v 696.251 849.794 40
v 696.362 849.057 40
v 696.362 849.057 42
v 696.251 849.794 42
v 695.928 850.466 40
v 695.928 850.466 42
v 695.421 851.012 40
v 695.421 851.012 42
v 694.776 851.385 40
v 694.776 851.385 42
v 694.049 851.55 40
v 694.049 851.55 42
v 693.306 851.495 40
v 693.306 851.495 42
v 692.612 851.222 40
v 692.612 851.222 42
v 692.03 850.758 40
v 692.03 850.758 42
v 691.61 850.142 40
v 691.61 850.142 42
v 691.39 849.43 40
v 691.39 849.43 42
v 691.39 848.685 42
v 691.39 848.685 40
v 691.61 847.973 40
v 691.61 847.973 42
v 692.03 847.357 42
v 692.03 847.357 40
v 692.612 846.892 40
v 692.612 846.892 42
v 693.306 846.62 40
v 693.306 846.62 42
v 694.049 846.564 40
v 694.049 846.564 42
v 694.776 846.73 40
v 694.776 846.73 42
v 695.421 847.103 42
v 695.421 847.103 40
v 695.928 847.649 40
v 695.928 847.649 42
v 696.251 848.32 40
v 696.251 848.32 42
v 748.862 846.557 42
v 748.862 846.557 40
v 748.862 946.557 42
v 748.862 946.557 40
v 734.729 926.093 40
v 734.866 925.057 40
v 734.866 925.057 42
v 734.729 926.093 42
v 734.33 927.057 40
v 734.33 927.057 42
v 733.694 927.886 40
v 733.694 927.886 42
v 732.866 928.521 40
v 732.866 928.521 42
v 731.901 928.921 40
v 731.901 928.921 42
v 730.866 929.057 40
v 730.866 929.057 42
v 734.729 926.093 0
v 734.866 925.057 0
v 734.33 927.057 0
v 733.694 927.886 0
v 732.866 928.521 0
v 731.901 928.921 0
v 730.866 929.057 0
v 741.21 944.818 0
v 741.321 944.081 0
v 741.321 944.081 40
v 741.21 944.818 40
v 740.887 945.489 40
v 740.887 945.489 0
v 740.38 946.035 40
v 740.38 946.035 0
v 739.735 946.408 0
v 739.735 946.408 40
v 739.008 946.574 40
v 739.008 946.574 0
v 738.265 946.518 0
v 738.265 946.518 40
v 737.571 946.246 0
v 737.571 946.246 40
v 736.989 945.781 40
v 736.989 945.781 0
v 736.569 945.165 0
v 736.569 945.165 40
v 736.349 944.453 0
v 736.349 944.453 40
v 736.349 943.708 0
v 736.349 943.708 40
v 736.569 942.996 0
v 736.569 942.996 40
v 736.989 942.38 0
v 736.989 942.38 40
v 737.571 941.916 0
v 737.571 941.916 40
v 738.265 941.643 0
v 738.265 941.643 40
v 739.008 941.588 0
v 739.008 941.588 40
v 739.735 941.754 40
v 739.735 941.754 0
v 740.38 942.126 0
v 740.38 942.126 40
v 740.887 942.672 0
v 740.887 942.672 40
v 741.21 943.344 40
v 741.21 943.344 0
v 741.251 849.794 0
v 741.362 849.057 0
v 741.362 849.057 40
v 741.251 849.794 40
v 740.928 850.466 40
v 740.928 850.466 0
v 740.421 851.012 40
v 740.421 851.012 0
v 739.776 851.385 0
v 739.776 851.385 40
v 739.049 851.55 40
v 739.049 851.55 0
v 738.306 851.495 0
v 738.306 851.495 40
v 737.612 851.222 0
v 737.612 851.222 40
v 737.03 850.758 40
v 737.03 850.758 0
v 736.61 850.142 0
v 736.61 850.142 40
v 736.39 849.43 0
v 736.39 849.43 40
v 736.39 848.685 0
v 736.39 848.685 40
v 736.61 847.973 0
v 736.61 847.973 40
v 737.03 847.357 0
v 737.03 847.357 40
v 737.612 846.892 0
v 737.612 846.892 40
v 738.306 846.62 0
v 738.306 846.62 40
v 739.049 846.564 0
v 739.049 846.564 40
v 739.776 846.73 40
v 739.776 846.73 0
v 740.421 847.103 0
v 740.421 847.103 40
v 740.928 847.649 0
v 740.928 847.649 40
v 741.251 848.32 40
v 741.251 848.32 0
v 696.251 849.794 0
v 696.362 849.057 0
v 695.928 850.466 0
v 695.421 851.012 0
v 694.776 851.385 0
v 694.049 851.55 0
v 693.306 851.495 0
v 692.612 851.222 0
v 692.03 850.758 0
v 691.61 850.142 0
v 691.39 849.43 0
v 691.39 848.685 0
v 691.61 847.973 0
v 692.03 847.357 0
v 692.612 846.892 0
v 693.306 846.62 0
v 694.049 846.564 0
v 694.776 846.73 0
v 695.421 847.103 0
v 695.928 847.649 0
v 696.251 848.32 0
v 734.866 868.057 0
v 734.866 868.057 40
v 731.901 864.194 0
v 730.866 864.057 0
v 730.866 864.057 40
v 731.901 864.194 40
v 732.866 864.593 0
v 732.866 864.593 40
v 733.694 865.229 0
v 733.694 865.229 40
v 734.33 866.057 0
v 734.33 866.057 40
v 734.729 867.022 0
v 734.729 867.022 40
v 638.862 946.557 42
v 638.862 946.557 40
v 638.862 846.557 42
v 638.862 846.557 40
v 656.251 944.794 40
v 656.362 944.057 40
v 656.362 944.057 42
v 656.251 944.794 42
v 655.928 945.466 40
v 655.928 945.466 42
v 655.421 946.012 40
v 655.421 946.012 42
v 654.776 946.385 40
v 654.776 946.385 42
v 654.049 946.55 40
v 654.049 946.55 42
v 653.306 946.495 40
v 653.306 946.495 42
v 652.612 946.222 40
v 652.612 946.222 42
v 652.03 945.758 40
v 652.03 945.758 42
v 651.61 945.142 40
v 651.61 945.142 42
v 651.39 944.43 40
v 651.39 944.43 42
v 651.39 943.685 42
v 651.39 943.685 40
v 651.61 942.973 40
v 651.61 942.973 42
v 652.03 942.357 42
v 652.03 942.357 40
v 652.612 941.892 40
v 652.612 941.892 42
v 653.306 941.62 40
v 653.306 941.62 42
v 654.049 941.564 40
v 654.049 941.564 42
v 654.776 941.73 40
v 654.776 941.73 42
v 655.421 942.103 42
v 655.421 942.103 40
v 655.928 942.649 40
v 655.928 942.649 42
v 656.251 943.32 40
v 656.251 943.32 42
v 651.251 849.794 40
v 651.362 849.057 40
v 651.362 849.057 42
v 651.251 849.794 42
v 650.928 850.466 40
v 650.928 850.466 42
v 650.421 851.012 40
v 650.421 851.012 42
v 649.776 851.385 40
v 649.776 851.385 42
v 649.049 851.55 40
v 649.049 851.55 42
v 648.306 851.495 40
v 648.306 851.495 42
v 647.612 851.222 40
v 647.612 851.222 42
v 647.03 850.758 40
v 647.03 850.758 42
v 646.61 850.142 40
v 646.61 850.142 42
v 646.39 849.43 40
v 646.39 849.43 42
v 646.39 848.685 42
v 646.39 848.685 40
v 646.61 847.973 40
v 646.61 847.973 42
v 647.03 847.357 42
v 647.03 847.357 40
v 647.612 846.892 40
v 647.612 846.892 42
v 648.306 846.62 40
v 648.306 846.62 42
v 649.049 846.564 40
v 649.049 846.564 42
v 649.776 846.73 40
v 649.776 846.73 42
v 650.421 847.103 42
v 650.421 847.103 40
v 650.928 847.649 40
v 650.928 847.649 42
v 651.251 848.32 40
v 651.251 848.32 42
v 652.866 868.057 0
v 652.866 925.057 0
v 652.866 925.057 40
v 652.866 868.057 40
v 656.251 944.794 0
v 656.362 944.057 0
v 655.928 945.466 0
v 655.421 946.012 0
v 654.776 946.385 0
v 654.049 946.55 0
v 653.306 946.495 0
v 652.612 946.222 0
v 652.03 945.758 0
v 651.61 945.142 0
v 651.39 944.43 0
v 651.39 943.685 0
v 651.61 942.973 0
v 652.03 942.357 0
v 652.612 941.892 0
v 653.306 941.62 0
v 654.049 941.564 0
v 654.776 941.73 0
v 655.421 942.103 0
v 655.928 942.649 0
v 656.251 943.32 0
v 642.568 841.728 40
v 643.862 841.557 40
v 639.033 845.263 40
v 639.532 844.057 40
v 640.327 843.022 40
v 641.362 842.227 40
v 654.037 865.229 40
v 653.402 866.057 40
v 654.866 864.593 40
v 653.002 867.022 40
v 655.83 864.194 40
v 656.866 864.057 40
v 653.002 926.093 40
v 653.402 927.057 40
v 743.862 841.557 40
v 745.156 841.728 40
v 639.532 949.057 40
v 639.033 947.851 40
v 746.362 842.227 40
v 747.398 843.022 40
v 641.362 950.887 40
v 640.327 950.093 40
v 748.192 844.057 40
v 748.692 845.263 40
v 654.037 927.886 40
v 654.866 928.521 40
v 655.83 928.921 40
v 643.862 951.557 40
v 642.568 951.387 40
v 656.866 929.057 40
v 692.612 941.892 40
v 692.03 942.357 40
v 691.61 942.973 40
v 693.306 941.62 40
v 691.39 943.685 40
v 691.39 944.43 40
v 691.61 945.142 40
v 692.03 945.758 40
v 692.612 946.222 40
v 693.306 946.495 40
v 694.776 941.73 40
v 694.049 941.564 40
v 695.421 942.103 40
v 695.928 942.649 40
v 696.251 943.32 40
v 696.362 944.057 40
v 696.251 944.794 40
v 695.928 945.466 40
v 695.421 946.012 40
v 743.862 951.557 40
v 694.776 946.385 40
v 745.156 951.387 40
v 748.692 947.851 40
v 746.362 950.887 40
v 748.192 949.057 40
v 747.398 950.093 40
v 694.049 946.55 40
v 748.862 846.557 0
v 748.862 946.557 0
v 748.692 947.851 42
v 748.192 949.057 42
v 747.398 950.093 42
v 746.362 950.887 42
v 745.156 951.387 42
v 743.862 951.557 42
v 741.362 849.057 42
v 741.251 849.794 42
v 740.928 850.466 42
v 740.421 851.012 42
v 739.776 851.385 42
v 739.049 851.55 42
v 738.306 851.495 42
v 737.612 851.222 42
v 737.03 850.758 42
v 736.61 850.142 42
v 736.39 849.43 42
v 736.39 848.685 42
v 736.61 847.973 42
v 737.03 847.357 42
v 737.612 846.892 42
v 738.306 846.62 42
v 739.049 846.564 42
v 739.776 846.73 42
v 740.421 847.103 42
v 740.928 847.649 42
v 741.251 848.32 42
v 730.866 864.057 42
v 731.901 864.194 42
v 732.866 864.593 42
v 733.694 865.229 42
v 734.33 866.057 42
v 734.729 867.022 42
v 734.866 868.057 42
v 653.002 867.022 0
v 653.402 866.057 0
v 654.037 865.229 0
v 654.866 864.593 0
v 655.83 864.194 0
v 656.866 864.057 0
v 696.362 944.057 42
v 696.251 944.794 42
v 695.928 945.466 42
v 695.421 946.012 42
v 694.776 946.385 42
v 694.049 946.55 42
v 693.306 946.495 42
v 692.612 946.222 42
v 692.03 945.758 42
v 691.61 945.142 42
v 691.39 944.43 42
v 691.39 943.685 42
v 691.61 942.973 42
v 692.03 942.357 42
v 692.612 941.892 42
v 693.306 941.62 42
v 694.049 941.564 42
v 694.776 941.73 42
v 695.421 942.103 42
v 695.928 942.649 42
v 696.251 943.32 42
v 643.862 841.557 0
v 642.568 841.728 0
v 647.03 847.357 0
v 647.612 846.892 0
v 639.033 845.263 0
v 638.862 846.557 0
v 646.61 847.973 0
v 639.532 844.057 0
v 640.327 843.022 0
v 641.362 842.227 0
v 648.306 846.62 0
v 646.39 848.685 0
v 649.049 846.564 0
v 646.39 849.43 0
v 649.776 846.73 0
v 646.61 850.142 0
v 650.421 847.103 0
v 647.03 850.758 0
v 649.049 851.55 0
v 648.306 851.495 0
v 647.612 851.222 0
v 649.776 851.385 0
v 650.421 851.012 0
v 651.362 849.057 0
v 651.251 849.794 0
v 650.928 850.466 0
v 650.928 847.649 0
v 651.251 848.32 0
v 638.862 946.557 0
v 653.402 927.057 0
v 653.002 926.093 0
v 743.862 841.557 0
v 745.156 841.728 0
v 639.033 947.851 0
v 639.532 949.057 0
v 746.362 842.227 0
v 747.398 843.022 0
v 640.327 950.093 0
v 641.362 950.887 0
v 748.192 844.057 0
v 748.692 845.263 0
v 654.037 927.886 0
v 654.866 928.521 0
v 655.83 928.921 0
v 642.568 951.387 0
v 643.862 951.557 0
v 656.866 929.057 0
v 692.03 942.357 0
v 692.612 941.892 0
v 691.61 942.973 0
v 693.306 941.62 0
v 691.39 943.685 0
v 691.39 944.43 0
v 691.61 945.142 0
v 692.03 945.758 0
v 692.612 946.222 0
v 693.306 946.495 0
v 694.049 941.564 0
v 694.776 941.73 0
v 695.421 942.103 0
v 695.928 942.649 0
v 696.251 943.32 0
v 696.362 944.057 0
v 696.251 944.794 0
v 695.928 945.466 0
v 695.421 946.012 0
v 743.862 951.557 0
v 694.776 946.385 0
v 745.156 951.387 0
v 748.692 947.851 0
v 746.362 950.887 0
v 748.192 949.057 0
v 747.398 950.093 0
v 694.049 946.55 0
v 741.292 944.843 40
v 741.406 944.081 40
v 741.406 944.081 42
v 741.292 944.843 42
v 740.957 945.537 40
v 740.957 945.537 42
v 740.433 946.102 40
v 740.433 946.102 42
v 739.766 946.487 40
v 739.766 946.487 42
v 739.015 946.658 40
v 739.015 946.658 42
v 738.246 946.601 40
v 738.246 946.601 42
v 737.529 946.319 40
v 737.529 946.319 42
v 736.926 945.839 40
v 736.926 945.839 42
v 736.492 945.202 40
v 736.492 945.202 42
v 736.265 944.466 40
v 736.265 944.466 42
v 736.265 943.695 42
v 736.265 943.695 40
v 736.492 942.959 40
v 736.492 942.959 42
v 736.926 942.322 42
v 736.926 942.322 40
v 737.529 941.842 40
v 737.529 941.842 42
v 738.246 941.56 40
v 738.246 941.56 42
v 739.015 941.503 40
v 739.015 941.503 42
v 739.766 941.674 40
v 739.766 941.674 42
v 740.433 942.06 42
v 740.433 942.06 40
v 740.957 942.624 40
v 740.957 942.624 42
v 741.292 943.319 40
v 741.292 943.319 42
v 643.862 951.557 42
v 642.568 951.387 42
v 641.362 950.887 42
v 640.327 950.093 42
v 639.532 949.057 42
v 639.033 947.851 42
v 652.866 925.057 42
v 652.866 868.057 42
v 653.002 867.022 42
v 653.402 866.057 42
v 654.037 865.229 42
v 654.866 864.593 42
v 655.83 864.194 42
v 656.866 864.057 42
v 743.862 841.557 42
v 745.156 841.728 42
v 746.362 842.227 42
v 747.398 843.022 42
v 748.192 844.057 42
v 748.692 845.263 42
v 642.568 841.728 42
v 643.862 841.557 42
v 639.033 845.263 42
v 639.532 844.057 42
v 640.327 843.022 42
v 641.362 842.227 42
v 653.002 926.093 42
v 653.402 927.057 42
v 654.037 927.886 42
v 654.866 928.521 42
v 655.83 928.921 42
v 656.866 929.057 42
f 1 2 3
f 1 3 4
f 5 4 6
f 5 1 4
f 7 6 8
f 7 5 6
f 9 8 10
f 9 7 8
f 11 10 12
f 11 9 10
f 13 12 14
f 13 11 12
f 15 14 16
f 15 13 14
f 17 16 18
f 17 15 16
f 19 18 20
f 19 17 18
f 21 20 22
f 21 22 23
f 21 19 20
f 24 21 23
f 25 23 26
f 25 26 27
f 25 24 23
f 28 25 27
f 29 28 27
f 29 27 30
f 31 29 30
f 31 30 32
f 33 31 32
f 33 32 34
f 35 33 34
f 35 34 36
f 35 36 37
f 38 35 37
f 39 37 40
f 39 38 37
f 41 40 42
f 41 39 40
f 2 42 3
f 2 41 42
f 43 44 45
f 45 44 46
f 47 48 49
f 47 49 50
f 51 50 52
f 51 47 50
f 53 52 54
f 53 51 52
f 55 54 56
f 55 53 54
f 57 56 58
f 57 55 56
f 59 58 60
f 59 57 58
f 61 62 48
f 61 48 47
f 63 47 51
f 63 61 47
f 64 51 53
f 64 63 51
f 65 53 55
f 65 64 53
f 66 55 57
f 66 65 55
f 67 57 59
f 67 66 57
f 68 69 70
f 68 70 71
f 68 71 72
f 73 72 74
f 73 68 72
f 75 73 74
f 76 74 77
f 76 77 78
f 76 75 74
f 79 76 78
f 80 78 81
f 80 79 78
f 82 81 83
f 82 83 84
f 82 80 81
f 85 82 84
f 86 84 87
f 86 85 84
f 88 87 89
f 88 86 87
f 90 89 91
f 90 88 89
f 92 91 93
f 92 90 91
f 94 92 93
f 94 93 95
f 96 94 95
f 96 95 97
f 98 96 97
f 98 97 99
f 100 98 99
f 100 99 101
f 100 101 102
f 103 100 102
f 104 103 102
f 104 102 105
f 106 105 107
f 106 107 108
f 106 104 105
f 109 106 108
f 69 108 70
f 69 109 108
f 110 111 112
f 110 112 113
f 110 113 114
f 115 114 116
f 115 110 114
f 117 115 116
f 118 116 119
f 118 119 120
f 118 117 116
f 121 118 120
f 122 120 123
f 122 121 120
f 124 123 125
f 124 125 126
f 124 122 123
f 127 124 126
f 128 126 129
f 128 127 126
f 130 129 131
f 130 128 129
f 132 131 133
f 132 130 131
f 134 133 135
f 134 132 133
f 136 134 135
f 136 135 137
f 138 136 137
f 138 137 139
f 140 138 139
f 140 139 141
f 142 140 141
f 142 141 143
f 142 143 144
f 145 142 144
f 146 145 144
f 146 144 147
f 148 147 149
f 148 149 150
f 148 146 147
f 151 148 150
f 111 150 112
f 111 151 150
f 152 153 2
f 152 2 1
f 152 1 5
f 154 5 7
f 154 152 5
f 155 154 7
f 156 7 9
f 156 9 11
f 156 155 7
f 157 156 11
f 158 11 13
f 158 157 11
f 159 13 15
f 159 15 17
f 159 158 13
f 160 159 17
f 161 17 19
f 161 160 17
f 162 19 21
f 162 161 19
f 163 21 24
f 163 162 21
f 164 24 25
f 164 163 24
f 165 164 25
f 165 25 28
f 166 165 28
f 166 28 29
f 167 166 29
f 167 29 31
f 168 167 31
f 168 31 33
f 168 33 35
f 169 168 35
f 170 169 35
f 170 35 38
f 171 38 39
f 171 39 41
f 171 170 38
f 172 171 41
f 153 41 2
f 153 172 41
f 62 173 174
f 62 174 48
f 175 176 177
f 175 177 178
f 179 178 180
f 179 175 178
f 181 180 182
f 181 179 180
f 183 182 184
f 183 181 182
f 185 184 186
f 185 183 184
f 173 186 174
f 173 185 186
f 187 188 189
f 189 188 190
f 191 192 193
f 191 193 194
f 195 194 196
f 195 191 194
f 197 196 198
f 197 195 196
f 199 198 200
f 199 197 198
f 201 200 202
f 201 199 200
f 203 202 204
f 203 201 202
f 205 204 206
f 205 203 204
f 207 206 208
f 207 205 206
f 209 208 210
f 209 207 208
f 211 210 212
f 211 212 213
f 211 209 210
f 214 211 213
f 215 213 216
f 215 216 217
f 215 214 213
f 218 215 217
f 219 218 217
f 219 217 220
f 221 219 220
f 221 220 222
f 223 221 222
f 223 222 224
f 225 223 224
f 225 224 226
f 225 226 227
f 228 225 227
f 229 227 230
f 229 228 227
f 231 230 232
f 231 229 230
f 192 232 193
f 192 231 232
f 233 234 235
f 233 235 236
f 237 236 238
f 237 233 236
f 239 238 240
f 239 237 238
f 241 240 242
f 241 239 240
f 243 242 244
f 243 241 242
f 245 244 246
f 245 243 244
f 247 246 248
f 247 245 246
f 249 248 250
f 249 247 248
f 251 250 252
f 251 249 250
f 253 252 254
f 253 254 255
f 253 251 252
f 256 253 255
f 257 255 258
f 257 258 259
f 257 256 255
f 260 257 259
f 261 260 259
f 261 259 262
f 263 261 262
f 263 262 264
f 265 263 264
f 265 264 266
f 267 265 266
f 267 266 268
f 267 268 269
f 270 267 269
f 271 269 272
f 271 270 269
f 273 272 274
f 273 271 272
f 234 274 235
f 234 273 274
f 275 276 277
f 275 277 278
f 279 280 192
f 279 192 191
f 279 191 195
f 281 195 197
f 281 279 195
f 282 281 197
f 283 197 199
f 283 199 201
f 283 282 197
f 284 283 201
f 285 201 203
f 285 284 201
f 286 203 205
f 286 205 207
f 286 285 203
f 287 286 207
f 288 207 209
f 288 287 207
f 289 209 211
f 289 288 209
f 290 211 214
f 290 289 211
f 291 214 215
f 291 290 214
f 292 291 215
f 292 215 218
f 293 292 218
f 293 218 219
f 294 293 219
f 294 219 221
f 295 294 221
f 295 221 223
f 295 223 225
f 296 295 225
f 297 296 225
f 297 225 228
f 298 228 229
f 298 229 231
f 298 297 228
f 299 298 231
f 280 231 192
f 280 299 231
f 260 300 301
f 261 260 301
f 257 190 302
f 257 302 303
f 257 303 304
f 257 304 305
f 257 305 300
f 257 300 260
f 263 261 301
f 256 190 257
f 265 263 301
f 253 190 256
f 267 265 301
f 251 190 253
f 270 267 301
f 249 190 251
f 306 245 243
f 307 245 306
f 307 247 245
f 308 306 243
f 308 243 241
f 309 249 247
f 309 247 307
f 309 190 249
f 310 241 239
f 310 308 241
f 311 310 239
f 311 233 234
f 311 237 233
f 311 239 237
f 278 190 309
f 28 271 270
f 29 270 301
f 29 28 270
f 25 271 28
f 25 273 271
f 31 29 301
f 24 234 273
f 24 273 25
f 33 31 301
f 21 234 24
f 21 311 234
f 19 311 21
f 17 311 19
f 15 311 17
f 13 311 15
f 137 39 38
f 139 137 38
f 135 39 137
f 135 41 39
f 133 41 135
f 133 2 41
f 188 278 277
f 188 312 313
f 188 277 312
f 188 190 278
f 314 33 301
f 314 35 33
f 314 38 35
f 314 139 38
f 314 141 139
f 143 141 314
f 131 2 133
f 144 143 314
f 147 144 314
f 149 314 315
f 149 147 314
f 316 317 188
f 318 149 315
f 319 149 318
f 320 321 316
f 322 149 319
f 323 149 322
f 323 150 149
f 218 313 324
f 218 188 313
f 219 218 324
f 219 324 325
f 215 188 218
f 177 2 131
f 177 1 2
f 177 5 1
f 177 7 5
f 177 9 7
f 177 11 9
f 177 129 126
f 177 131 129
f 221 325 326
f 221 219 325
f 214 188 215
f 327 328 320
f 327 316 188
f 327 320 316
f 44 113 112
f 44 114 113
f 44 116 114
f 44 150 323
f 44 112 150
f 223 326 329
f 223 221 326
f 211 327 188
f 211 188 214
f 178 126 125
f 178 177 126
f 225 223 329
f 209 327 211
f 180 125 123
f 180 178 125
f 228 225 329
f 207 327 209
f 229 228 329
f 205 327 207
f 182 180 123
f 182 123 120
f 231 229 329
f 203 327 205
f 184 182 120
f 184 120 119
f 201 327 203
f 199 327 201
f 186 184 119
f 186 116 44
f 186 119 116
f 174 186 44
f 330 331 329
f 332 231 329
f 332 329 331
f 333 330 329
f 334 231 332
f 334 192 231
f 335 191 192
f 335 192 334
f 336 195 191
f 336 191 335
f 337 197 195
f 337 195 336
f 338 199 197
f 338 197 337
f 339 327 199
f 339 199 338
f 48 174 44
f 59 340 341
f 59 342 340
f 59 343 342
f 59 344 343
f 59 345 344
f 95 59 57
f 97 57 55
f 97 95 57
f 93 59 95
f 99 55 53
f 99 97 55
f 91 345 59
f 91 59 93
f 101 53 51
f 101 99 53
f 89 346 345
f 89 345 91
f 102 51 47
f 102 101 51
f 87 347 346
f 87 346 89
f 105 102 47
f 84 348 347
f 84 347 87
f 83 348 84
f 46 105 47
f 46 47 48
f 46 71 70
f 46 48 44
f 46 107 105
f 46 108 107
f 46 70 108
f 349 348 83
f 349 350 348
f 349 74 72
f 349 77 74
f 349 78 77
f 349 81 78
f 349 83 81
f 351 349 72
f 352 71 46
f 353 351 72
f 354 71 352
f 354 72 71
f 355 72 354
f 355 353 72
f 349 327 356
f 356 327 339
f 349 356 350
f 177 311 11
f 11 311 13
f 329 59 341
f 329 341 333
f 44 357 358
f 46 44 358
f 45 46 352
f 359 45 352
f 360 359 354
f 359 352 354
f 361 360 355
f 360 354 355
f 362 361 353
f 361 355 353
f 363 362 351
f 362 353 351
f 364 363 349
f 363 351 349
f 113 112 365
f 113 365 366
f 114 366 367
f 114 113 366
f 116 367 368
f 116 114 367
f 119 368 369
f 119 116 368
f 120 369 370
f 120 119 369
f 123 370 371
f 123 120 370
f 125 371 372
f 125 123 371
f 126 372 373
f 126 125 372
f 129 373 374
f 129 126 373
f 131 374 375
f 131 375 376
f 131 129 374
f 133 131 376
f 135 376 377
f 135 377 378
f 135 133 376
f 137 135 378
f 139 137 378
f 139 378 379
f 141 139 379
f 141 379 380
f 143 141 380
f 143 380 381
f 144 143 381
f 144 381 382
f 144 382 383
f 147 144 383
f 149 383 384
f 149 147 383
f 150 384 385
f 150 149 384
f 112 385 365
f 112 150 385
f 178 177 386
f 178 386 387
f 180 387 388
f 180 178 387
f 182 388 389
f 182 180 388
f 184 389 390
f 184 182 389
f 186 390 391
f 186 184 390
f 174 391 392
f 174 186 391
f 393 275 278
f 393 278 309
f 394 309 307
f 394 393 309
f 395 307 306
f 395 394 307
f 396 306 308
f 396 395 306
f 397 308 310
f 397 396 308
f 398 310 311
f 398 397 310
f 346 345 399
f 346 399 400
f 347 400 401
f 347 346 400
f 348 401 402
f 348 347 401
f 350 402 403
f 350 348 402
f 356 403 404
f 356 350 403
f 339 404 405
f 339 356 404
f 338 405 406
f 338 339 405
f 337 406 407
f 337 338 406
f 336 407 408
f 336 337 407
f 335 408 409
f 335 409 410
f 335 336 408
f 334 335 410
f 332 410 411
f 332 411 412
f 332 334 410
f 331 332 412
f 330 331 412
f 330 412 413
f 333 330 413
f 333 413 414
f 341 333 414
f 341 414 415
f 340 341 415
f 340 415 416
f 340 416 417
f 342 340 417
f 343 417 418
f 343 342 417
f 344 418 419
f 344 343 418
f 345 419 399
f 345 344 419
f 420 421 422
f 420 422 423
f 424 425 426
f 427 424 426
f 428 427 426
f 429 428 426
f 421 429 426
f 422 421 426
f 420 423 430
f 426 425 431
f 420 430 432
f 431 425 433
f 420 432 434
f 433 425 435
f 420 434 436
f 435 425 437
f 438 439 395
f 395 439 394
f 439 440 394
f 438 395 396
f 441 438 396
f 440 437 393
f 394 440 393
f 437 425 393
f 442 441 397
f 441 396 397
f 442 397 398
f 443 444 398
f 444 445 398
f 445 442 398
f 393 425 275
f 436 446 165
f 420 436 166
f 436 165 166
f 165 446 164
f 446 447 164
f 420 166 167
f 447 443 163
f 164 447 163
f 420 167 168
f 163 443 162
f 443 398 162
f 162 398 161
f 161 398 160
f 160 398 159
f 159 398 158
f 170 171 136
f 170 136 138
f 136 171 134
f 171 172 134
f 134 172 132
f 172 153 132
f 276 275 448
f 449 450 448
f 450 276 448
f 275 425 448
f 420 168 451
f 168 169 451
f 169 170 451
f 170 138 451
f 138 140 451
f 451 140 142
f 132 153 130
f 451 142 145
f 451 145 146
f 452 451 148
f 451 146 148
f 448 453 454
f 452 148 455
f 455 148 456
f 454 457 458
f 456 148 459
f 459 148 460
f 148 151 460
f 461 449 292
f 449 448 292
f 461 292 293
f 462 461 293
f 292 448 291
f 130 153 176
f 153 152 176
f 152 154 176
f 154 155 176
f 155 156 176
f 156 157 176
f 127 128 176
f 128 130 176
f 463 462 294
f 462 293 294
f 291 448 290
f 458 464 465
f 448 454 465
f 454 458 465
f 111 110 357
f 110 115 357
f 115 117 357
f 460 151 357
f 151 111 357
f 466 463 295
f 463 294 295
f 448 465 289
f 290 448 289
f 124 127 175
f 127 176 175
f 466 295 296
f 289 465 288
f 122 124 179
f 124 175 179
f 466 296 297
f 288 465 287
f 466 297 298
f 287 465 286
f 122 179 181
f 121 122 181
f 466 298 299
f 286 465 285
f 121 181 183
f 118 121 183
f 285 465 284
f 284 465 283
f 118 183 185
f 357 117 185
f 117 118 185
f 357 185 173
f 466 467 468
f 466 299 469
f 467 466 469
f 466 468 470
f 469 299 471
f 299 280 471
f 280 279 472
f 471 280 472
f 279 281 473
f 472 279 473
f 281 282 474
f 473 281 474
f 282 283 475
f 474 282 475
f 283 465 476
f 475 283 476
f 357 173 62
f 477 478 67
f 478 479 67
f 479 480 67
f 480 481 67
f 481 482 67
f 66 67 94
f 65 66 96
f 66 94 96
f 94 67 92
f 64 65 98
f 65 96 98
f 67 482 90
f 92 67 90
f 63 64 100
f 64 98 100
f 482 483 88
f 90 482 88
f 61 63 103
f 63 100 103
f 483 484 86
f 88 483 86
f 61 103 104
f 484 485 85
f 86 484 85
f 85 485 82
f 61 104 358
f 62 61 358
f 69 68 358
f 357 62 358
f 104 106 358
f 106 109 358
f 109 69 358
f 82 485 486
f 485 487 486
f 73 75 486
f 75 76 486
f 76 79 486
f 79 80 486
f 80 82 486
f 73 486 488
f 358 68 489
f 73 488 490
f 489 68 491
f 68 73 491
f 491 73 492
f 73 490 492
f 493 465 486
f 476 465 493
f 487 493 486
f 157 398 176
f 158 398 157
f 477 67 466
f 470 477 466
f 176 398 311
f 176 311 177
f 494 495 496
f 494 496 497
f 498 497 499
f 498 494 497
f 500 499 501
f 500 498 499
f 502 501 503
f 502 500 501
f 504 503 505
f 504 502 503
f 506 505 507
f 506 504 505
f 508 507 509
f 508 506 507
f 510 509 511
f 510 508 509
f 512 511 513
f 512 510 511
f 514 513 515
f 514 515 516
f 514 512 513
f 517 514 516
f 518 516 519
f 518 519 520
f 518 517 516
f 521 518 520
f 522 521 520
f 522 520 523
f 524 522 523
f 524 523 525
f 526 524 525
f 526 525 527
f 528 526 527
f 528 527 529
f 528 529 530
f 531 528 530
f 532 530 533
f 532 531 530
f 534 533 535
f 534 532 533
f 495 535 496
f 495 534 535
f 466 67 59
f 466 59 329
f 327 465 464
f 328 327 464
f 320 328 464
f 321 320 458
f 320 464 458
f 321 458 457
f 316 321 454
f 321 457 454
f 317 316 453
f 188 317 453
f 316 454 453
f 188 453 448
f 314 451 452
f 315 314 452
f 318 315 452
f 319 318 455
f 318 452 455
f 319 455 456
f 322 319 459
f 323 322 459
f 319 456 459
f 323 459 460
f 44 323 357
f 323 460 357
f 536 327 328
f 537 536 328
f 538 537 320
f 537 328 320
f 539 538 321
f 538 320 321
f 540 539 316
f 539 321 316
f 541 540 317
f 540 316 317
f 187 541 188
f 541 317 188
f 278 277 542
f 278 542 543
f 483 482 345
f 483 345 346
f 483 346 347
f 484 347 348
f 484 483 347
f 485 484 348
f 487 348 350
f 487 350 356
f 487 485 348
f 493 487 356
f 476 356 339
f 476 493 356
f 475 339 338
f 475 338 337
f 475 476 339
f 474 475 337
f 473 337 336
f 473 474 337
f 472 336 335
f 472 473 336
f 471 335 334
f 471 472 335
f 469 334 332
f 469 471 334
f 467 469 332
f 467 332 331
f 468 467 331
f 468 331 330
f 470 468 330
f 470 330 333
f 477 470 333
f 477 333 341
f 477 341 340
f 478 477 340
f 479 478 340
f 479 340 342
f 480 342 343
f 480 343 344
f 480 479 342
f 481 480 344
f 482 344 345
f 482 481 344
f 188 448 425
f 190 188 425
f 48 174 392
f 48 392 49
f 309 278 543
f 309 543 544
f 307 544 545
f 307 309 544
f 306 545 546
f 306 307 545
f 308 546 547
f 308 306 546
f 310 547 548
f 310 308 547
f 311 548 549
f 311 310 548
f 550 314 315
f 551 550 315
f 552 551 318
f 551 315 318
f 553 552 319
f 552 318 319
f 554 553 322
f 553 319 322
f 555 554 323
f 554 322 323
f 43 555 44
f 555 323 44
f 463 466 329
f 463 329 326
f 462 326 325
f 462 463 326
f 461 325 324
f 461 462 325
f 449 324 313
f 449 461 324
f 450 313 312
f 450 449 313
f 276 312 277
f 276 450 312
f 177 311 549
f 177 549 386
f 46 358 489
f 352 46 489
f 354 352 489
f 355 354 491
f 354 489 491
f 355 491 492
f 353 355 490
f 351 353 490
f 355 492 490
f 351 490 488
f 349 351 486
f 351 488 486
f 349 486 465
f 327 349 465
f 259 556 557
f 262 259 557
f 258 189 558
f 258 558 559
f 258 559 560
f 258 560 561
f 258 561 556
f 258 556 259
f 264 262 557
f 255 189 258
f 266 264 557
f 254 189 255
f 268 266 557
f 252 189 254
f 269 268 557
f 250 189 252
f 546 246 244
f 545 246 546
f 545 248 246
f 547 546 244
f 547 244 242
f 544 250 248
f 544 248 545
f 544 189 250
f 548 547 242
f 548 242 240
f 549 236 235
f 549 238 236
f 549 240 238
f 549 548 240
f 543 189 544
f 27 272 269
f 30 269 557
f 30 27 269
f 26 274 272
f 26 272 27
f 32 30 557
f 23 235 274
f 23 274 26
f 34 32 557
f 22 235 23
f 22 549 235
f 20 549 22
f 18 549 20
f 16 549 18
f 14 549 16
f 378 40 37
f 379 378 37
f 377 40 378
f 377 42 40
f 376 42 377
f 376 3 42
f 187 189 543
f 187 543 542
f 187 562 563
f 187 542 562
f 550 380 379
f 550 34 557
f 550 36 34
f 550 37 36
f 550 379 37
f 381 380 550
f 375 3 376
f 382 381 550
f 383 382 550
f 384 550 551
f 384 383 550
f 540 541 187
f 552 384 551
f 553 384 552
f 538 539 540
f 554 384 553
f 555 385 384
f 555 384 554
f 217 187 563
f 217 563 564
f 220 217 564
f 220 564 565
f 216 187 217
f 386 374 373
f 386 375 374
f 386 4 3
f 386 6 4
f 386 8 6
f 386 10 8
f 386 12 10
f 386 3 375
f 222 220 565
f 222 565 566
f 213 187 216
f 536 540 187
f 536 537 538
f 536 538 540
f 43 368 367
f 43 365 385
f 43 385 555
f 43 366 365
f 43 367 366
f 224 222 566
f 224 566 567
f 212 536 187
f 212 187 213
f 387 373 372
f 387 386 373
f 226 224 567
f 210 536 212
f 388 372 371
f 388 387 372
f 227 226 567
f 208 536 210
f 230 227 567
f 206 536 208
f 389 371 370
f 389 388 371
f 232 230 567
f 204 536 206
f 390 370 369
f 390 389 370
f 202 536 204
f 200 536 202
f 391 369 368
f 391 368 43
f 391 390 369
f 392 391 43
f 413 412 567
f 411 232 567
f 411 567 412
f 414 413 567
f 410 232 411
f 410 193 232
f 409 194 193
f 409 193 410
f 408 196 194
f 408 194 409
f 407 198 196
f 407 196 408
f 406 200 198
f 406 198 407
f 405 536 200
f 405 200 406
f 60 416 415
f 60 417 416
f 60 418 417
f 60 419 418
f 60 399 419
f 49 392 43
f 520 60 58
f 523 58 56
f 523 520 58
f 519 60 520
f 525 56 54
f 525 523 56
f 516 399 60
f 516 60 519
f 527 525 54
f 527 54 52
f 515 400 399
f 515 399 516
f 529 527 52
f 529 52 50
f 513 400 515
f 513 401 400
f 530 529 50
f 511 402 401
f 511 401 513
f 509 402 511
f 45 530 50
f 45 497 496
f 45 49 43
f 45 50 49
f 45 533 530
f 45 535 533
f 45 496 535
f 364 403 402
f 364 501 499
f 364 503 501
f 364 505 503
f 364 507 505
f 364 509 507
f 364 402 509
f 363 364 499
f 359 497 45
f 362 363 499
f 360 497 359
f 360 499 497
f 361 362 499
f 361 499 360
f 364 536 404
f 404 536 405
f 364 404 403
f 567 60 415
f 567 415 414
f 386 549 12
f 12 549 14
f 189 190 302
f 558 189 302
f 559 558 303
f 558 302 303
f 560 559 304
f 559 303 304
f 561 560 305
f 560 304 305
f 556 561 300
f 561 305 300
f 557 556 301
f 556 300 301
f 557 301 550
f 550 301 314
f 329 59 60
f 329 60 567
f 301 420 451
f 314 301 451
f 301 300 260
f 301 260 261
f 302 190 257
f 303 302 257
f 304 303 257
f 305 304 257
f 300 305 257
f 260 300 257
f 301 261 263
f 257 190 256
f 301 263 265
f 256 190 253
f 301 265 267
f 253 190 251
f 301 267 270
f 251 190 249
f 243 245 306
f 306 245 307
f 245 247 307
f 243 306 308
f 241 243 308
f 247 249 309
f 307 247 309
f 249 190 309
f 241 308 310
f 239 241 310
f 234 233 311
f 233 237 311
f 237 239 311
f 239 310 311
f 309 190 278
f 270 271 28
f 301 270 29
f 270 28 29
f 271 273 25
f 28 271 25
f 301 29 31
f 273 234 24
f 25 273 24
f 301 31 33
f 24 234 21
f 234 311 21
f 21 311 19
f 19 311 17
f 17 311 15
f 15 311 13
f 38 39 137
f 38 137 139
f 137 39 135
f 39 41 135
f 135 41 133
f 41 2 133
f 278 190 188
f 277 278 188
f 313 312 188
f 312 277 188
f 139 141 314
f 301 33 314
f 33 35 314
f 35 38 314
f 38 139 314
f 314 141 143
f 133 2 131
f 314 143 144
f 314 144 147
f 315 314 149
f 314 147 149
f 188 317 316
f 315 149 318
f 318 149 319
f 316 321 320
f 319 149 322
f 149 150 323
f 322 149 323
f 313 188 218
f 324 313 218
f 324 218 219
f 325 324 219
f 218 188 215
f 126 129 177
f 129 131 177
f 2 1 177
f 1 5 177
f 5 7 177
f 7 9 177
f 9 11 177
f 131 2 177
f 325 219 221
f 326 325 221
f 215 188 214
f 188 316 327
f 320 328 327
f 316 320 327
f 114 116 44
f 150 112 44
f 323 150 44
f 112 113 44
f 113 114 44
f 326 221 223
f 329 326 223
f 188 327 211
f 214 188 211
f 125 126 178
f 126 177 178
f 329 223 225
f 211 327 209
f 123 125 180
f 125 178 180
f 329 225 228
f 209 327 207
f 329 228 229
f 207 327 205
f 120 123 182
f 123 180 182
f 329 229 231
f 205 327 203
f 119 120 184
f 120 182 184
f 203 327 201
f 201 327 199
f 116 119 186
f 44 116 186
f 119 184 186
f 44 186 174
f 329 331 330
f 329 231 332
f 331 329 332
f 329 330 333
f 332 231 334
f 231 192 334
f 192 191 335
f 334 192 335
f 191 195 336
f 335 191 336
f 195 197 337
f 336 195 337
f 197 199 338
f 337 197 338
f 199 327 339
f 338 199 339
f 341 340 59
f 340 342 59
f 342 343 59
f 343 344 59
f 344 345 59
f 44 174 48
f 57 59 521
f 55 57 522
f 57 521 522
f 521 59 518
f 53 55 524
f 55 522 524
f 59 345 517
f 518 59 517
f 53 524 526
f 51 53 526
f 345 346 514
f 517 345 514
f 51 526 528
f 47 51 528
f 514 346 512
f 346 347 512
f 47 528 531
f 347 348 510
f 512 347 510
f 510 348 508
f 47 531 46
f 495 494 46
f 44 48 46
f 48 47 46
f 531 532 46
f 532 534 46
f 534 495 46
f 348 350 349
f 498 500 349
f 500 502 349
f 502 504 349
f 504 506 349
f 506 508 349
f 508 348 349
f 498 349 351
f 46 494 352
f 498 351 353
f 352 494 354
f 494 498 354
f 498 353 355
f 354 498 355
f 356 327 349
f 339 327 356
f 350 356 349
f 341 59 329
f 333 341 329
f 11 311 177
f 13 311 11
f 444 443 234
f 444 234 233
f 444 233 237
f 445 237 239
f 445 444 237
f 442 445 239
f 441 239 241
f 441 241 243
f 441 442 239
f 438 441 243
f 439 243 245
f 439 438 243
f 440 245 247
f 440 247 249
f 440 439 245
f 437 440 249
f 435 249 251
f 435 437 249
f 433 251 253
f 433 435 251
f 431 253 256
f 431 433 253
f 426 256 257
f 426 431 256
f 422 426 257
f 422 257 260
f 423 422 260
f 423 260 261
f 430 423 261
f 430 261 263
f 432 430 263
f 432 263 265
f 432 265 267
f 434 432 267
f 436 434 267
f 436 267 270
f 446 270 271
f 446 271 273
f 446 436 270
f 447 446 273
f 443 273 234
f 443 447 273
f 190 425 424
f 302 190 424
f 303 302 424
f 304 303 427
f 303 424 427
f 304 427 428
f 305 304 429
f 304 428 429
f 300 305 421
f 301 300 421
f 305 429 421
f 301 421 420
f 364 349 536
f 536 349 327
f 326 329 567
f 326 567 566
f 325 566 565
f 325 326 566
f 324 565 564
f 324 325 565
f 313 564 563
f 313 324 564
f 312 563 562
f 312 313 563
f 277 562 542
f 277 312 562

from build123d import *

# Parameters (mm, degrees)
CROQUIS2_R              = 2.5
SALIENTE_EXTRUIR1_DEPTH = 40
CROQUIS3_R              = 2.5
CROQUIS3_R_2            = 2.585039772
SALIENTE_EXTRUIR2_DEPTH = 2


with BuildPart() as part:
    # Croquis2 → Saliente-Extruir1 (new body)
    with BuildSketch(Plane.XY):
        with BuildLine():
            Line((643.862272549, 841.557366956), (743.862272549, 841.557366956))
            ThreePointArc((743.862272549, 841.557366956), (747.397806455, 843.02183305), (748.862272549, 846.557366956))
            Line((748.862272549, 846.557366956), (748.862272549, 946.557366956))
            ThreePointArc((748.862272549, 946.557366956), (747.397806455, 950.092900862), (743.862272549, 951.557366956))
            Line((743.862272549, 951.557366956), (643.862272549, 951.557366956))
            ThreePointArc((643.862272549, 951.557366956), (640.326738643, 950.092900862), (638.862272549, 946.557366956))
            Line((638.862272549, 946.557366956), (638.862272549, 846.557366956))
            ThreePointArc((638.862272549, 846.557366956), (640.326738643, 843.02183305), (643.862272549, 841.557366956))
        make_face()
        with Locations((693.862272549, 944.057366956)):
            Circle(CROQUIS2_R, mode=Mode.SUBTRACT)
        with Locations((653.862272549, 944.057366956)):
            Circle(CROQUIS2_R, mode=Mode.SUBTRACT)
        with Locations((738.82139492, 944.080684435)):
            Circle(CROQUIS2_R, mode=Mode.SUBTRACT)
        with Locations((738.862272549, 849.057366956)):
            Circle(CROQUIS2_R, mode=Mode.SUBTRACT)
        with Locations((693.862272549, 849.057366956)):
            Circle(CROQUIS2_R, mode=Mode.SUBTRACT)
        with Locations((648.862272549, 849.057366956)):
            Circle(CROQUIS2_R, mode=Mode.SUBTRACT)
        with BuildLine():
            Line((734.865717045, 868.057366956), (734.865717045, 925.057366956))
            ThreePointArc((734.865717045, 925.057366956), (733.69414417, 927.885794081), (730.865717045, 929.057366956))
            Line((730.865717045, 929.057366956), (656.865717045, 929.057366956))
            ThreePointArc((656.865717045, 929.057366956), (654.03728992, 927.885794081), (652.865717045, 925.057366956))
            Line((652.865717045, 925.057366956), (652.865717045, 868.057366956))
            ThreePointArc((652.865717045, 868.057366956), (654.03728992, 865.228939831), (656.865717045, 864.057366956))
            Line((656.865717045, 864.057366956), (730.865717045, 864.057366956))
            ThreePointArc((730.865717045, 864.057366956), (733.69414417, 865.228939831), (734.865717045, 868.057366956))
        make_face(mode=Mode.SUBTRACT)
    extrude(amount=SALIENTE_EXTRUIR1_DEPTH)


with BuildPart() as body_2:
    # Croquis3 → Saliente-Extruir2 (new body)
    with BuildSketch(Plane.XY.offset(40)):
        with BuildLine():
            Line((643.862272549, 841.557366956), (743.862272549, 841.557366956))
            ThreePointArc((743.862272549, 841.557366956), (747.397806455, 843.02183305), (748.862272549, 846.557366956))
            Line((748.862272549, 846.557366956), (748.862272549, 946.557366956))
            ThreePointArc((748.862272549, 946.557366956), (747.397806455, 950.092900862), (743.862272549, 951.557366956))
            Line((743.862272549, 951.557366956), (643.862272549, 951.557366956))
            ThreePointArc((643.862272549, 951.557366956), (640.326738643, 950.092900862), (638.862272549, 946.557366956))
            Line((638.862272549, 946.557366956), (638.862272549, 846.557366956))
            ThreePointArc((638.862272549, 846.557366956), (640.326738643, 843.02183305), (643.862272549, 841.557366956))
        make_face()
        with Locations((653.862272549, 944.057366956)):
            Circle(CROQUIS3_R, mode=Mode.SUBTRACT)
        with Locations((693.862272549, 944.057366956)):
            Circle(CROQUIS3_R, mode=Mode.SUBTRACT)
        with Locations((738.82139492, 944.080684435)):
            Circle(CROQUIS3_R_2, mode=Mode.SUBTRACT)
        with Locations((738.862272549, 849.057366956)):
            Circle(CROQUIS3_R, mode=Mode.SUBTRACT)
        with Locations((693.862272549, 849.057366956)):
            Circle(CROQUIS3_R, mode=Mode.SUBTRACT)
        with Locations((648.862272549, 849.057366956)):
            Circle(CROQUIS3_R, mode=Mode.SUBTRACT)
        with BuildLine():
            Line((730.865717045, 929.057366956), (656.865717045, 929.057366956))
            ThreePointArc((656.865717045, 929.057366956), (654.03728992, 927.885794081), (652.865717045, 925.057366956))
            Line((652.865717045, 925.057366956), (652.865717045, 868.057366956))
            ThreePointArc((652.865717045, 868.057366956), (654.03728992, 865.228939831), (656.865717045, 864.057366956))
            Line((656.865717045, 864.057366956), (730.865717045, 864.057366956))
            ThreePointArc((730.865717045, 864.057366956), (733.69414417, 865.228939831), (734.865717045, 868.057366956))
            Line((734.865717045, 868.057366956), (734.865717045, 925.057366956))
            ThreePointArc((734.865717045, 925.057366956), (733.69414417, 927.885794081), (730.865717045, 929.057366956))
        make_face(mode=Mode.SUBTRACT)
    extrude(amount=SALIENTE_EXTRUIR2_DEPTH)


solid = Compound([part.part, body_2.part])
